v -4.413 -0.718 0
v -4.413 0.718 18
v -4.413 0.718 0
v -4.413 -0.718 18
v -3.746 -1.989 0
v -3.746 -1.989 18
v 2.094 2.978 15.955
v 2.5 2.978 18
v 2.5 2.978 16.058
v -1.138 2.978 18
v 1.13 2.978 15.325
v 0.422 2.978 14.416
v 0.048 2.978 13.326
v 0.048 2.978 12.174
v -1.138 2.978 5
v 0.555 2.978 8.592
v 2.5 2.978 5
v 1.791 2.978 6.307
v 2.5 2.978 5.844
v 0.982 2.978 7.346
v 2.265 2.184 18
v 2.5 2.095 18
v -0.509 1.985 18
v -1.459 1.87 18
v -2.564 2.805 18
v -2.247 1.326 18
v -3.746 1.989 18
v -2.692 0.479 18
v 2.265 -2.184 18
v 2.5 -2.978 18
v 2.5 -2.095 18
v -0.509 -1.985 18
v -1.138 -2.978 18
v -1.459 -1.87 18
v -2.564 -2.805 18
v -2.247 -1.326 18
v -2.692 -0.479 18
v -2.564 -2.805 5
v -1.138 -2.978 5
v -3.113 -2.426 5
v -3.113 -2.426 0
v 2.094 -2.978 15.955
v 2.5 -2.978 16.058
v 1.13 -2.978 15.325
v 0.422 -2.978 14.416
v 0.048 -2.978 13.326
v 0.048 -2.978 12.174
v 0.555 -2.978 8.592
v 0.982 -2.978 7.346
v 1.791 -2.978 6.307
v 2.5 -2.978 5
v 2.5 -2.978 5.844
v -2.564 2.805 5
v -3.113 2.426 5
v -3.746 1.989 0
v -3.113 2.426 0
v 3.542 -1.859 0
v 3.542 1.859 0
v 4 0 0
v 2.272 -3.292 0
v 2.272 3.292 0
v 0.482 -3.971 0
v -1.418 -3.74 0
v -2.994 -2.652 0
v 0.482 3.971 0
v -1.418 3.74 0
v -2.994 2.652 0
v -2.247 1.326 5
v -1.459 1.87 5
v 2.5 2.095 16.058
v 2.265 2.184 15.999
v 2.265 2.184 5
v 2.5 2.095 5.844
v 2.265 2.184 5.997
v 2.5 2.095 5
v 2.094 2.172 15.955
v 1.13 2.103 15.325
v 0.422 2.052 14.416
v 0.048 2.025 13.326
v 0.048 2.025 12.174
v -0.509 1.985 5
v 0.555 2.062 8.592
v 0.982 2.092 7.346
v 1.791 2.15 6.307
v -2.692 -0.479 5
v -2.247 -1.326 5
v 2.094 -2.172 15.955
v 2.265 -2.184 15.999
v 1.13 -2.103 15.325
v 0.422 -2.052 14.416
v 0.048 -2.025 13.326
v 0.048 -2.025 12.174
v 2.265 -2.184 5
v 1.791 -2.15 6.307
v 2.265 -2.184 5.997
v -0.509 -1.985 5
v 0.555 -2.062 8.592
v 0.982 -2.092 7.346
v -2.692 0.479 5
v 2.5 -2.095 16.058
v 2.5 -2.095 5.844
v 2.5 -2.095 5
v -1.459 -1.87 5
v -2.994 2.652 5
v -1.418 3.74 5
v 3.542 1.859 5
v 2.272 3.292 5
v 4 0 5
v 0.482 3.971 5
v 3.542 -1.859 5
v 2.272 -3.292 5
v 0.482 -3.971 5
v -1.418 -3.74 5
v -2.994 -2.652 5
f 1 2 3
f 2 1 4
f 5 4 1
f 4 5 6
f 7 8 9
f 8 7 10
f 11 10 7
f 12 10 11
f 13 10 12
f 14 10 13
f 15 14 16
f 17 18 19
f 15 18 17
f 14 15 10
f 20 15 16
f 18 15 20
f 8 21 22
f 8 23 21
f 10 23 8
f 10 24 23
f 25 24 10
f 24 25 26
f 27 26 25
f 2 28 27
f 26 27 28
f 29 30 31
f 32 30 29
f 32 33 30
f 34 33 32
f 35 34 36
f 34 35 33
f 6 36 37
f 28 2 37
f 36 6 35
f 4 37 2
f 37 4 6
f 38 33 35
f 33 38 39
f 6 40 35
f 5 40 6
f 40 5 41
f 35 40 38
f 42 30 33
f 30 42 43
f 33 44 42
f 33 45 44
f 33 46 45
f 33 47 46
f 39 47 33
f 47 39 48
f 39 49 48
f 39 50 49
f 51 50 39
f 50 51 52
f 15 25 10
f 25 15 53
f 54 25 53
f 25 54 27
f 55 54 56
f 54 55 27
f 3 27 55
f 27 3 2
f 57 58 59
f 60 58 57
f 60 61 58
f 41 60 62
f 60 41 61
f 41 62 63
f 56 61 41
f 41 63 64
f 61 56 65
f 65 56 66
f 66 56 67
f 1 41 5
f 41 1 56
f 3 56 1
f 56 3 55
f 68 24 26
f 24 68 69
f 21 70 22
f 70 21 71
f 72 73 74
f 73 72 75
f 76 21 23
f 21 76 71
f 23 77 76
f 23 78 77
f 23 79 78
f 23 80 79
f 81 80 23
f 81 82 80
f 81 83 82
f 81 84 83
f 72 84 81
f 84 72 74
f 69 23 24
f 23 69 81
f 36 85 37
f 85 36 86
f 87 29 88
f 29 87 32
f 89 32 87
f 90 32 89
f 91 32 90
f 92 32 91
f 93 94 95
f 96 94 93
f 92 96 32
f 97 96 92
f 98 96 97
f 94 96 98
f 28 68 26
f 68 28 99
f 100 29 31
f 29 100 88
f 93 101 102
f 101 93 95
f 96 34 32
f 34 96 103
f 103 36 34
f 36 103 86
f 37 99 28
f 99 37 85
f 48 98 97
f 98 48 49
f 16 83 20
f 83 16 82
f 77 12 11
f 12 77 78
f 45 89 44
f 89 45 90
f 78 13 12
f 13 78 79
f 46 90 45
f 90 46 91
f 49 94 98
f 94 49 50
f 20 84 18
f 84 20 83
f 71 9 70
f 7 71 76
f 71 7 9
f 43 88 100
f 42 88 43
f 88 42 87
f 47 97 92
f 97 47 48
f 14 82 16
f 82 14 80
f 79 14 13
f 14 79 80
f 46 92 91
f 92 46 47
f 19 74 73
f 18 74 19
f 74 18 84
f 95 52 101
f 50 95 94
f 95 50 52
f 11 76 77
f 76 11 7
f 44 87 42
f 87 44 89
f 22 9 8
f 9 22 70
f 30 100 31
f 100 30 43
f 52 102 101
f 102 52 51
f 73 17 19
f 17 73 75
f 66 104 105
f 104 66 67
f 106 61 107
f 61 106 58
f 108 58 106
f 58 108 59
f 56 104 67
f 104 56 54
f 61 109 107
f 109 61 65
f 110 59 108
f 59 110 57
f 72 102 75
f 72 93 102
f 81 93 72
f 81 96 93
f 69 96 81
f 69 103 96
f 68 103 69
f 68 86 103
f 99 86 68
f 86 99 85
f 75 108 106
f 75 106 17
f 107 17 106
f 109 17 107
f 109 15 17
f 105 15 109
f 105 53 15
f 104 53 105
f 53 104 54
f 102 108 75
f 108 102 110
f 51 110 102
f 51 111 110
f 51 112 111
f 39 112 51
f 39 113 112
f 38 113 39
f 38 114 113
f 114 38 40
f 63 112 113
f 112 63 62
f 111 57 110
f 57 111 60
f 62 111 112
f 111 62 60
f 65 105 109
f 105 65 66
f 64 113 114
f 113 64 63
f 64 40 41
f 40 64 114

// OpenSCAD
/*
    Openscad Rubber-band Loom.

    This is a rubber-band loom for weaving.

    Copyright (C) 2014. Tim Molteno, tim@molteno.net
  
    This program is free software: you can redistribute it and/or modify
    it under the terms of the GNU General Public License as published by
    the Free Software Foundation, either version 3 of the License, or
    (at your option) any later version.

    This program is distributed in the hope that it will be useful,
    but WITHOUT ANY WARRANTY; without even the implied warranty of
    MERCHANTABILITY or FITNESS FOR A PARTICULAR PURPOSE.  See the
    GNU General Public License for more details.

    You should have received a copy of the GNU General Public License
    along with this program.  If not, see <http://www.gnu.org/licenses/>.
*/

post_height  = 18.0;  /* Height of the Loom from Bottom to top */
base_height  = 4.0;   /* Height of the base (mm) */

  
module post(h) {
  difference() {
    hull() {
      translate([ 5,0,0]) cylinder(r = 3, h=h, $fn=13);
      translate([-1.5,0,0]) cylinder(r = 3, h=h, $fn=13);
    }
    hull() {
      translate([-0.75,0,-1]) cylinder(r = 2.0, h=h + 2, $fn=13);
      translate([2,0,-1]) cylinder(r = 2.2, h=h + 2, $fn=13);
    }
    translate([2.5,0, base_height+3.75]) hull() {
      translate([2,0,1.5]) rotate([90,0,0]) cylinder(r=4, h=10, center=true, $fn=19);
      translate([1,0,5]) rotate([90,0,0]) cylinder(r=3.5, h=10, center=true, $fn=19);
    }
    translate([2.5,-5,-2.5]) cube([10,10,h+5]);
  }
  cylinder(r=4, h=base_height+1);
}


module base(width, center, step_angle) {
  
  for (angle = [0:step_angle:(360 - step_angle)]) {
    rotate(angle)  translate([width/2-1.5,0,0]) post(post_height);
  }
  difference() {
    cylinder(r=width/2, h=base_height,$fn=31);
    translate([0,0,-1]) cylinder(r=center/2, h=12, $fn=31); // Center Hole
  }
}


module loom(n_posts, post_spacing) {

  width = (post_spacing*n_posts) / 3.1415;
  center = width - 12.0;
  step_angle = 360 / n_posts;


  intersection() {
    base(width, center, step_angle);
    cylinder(r=width/2, h=50, $fn=31);
  }
}


//loom(8, 12);
post(18);
